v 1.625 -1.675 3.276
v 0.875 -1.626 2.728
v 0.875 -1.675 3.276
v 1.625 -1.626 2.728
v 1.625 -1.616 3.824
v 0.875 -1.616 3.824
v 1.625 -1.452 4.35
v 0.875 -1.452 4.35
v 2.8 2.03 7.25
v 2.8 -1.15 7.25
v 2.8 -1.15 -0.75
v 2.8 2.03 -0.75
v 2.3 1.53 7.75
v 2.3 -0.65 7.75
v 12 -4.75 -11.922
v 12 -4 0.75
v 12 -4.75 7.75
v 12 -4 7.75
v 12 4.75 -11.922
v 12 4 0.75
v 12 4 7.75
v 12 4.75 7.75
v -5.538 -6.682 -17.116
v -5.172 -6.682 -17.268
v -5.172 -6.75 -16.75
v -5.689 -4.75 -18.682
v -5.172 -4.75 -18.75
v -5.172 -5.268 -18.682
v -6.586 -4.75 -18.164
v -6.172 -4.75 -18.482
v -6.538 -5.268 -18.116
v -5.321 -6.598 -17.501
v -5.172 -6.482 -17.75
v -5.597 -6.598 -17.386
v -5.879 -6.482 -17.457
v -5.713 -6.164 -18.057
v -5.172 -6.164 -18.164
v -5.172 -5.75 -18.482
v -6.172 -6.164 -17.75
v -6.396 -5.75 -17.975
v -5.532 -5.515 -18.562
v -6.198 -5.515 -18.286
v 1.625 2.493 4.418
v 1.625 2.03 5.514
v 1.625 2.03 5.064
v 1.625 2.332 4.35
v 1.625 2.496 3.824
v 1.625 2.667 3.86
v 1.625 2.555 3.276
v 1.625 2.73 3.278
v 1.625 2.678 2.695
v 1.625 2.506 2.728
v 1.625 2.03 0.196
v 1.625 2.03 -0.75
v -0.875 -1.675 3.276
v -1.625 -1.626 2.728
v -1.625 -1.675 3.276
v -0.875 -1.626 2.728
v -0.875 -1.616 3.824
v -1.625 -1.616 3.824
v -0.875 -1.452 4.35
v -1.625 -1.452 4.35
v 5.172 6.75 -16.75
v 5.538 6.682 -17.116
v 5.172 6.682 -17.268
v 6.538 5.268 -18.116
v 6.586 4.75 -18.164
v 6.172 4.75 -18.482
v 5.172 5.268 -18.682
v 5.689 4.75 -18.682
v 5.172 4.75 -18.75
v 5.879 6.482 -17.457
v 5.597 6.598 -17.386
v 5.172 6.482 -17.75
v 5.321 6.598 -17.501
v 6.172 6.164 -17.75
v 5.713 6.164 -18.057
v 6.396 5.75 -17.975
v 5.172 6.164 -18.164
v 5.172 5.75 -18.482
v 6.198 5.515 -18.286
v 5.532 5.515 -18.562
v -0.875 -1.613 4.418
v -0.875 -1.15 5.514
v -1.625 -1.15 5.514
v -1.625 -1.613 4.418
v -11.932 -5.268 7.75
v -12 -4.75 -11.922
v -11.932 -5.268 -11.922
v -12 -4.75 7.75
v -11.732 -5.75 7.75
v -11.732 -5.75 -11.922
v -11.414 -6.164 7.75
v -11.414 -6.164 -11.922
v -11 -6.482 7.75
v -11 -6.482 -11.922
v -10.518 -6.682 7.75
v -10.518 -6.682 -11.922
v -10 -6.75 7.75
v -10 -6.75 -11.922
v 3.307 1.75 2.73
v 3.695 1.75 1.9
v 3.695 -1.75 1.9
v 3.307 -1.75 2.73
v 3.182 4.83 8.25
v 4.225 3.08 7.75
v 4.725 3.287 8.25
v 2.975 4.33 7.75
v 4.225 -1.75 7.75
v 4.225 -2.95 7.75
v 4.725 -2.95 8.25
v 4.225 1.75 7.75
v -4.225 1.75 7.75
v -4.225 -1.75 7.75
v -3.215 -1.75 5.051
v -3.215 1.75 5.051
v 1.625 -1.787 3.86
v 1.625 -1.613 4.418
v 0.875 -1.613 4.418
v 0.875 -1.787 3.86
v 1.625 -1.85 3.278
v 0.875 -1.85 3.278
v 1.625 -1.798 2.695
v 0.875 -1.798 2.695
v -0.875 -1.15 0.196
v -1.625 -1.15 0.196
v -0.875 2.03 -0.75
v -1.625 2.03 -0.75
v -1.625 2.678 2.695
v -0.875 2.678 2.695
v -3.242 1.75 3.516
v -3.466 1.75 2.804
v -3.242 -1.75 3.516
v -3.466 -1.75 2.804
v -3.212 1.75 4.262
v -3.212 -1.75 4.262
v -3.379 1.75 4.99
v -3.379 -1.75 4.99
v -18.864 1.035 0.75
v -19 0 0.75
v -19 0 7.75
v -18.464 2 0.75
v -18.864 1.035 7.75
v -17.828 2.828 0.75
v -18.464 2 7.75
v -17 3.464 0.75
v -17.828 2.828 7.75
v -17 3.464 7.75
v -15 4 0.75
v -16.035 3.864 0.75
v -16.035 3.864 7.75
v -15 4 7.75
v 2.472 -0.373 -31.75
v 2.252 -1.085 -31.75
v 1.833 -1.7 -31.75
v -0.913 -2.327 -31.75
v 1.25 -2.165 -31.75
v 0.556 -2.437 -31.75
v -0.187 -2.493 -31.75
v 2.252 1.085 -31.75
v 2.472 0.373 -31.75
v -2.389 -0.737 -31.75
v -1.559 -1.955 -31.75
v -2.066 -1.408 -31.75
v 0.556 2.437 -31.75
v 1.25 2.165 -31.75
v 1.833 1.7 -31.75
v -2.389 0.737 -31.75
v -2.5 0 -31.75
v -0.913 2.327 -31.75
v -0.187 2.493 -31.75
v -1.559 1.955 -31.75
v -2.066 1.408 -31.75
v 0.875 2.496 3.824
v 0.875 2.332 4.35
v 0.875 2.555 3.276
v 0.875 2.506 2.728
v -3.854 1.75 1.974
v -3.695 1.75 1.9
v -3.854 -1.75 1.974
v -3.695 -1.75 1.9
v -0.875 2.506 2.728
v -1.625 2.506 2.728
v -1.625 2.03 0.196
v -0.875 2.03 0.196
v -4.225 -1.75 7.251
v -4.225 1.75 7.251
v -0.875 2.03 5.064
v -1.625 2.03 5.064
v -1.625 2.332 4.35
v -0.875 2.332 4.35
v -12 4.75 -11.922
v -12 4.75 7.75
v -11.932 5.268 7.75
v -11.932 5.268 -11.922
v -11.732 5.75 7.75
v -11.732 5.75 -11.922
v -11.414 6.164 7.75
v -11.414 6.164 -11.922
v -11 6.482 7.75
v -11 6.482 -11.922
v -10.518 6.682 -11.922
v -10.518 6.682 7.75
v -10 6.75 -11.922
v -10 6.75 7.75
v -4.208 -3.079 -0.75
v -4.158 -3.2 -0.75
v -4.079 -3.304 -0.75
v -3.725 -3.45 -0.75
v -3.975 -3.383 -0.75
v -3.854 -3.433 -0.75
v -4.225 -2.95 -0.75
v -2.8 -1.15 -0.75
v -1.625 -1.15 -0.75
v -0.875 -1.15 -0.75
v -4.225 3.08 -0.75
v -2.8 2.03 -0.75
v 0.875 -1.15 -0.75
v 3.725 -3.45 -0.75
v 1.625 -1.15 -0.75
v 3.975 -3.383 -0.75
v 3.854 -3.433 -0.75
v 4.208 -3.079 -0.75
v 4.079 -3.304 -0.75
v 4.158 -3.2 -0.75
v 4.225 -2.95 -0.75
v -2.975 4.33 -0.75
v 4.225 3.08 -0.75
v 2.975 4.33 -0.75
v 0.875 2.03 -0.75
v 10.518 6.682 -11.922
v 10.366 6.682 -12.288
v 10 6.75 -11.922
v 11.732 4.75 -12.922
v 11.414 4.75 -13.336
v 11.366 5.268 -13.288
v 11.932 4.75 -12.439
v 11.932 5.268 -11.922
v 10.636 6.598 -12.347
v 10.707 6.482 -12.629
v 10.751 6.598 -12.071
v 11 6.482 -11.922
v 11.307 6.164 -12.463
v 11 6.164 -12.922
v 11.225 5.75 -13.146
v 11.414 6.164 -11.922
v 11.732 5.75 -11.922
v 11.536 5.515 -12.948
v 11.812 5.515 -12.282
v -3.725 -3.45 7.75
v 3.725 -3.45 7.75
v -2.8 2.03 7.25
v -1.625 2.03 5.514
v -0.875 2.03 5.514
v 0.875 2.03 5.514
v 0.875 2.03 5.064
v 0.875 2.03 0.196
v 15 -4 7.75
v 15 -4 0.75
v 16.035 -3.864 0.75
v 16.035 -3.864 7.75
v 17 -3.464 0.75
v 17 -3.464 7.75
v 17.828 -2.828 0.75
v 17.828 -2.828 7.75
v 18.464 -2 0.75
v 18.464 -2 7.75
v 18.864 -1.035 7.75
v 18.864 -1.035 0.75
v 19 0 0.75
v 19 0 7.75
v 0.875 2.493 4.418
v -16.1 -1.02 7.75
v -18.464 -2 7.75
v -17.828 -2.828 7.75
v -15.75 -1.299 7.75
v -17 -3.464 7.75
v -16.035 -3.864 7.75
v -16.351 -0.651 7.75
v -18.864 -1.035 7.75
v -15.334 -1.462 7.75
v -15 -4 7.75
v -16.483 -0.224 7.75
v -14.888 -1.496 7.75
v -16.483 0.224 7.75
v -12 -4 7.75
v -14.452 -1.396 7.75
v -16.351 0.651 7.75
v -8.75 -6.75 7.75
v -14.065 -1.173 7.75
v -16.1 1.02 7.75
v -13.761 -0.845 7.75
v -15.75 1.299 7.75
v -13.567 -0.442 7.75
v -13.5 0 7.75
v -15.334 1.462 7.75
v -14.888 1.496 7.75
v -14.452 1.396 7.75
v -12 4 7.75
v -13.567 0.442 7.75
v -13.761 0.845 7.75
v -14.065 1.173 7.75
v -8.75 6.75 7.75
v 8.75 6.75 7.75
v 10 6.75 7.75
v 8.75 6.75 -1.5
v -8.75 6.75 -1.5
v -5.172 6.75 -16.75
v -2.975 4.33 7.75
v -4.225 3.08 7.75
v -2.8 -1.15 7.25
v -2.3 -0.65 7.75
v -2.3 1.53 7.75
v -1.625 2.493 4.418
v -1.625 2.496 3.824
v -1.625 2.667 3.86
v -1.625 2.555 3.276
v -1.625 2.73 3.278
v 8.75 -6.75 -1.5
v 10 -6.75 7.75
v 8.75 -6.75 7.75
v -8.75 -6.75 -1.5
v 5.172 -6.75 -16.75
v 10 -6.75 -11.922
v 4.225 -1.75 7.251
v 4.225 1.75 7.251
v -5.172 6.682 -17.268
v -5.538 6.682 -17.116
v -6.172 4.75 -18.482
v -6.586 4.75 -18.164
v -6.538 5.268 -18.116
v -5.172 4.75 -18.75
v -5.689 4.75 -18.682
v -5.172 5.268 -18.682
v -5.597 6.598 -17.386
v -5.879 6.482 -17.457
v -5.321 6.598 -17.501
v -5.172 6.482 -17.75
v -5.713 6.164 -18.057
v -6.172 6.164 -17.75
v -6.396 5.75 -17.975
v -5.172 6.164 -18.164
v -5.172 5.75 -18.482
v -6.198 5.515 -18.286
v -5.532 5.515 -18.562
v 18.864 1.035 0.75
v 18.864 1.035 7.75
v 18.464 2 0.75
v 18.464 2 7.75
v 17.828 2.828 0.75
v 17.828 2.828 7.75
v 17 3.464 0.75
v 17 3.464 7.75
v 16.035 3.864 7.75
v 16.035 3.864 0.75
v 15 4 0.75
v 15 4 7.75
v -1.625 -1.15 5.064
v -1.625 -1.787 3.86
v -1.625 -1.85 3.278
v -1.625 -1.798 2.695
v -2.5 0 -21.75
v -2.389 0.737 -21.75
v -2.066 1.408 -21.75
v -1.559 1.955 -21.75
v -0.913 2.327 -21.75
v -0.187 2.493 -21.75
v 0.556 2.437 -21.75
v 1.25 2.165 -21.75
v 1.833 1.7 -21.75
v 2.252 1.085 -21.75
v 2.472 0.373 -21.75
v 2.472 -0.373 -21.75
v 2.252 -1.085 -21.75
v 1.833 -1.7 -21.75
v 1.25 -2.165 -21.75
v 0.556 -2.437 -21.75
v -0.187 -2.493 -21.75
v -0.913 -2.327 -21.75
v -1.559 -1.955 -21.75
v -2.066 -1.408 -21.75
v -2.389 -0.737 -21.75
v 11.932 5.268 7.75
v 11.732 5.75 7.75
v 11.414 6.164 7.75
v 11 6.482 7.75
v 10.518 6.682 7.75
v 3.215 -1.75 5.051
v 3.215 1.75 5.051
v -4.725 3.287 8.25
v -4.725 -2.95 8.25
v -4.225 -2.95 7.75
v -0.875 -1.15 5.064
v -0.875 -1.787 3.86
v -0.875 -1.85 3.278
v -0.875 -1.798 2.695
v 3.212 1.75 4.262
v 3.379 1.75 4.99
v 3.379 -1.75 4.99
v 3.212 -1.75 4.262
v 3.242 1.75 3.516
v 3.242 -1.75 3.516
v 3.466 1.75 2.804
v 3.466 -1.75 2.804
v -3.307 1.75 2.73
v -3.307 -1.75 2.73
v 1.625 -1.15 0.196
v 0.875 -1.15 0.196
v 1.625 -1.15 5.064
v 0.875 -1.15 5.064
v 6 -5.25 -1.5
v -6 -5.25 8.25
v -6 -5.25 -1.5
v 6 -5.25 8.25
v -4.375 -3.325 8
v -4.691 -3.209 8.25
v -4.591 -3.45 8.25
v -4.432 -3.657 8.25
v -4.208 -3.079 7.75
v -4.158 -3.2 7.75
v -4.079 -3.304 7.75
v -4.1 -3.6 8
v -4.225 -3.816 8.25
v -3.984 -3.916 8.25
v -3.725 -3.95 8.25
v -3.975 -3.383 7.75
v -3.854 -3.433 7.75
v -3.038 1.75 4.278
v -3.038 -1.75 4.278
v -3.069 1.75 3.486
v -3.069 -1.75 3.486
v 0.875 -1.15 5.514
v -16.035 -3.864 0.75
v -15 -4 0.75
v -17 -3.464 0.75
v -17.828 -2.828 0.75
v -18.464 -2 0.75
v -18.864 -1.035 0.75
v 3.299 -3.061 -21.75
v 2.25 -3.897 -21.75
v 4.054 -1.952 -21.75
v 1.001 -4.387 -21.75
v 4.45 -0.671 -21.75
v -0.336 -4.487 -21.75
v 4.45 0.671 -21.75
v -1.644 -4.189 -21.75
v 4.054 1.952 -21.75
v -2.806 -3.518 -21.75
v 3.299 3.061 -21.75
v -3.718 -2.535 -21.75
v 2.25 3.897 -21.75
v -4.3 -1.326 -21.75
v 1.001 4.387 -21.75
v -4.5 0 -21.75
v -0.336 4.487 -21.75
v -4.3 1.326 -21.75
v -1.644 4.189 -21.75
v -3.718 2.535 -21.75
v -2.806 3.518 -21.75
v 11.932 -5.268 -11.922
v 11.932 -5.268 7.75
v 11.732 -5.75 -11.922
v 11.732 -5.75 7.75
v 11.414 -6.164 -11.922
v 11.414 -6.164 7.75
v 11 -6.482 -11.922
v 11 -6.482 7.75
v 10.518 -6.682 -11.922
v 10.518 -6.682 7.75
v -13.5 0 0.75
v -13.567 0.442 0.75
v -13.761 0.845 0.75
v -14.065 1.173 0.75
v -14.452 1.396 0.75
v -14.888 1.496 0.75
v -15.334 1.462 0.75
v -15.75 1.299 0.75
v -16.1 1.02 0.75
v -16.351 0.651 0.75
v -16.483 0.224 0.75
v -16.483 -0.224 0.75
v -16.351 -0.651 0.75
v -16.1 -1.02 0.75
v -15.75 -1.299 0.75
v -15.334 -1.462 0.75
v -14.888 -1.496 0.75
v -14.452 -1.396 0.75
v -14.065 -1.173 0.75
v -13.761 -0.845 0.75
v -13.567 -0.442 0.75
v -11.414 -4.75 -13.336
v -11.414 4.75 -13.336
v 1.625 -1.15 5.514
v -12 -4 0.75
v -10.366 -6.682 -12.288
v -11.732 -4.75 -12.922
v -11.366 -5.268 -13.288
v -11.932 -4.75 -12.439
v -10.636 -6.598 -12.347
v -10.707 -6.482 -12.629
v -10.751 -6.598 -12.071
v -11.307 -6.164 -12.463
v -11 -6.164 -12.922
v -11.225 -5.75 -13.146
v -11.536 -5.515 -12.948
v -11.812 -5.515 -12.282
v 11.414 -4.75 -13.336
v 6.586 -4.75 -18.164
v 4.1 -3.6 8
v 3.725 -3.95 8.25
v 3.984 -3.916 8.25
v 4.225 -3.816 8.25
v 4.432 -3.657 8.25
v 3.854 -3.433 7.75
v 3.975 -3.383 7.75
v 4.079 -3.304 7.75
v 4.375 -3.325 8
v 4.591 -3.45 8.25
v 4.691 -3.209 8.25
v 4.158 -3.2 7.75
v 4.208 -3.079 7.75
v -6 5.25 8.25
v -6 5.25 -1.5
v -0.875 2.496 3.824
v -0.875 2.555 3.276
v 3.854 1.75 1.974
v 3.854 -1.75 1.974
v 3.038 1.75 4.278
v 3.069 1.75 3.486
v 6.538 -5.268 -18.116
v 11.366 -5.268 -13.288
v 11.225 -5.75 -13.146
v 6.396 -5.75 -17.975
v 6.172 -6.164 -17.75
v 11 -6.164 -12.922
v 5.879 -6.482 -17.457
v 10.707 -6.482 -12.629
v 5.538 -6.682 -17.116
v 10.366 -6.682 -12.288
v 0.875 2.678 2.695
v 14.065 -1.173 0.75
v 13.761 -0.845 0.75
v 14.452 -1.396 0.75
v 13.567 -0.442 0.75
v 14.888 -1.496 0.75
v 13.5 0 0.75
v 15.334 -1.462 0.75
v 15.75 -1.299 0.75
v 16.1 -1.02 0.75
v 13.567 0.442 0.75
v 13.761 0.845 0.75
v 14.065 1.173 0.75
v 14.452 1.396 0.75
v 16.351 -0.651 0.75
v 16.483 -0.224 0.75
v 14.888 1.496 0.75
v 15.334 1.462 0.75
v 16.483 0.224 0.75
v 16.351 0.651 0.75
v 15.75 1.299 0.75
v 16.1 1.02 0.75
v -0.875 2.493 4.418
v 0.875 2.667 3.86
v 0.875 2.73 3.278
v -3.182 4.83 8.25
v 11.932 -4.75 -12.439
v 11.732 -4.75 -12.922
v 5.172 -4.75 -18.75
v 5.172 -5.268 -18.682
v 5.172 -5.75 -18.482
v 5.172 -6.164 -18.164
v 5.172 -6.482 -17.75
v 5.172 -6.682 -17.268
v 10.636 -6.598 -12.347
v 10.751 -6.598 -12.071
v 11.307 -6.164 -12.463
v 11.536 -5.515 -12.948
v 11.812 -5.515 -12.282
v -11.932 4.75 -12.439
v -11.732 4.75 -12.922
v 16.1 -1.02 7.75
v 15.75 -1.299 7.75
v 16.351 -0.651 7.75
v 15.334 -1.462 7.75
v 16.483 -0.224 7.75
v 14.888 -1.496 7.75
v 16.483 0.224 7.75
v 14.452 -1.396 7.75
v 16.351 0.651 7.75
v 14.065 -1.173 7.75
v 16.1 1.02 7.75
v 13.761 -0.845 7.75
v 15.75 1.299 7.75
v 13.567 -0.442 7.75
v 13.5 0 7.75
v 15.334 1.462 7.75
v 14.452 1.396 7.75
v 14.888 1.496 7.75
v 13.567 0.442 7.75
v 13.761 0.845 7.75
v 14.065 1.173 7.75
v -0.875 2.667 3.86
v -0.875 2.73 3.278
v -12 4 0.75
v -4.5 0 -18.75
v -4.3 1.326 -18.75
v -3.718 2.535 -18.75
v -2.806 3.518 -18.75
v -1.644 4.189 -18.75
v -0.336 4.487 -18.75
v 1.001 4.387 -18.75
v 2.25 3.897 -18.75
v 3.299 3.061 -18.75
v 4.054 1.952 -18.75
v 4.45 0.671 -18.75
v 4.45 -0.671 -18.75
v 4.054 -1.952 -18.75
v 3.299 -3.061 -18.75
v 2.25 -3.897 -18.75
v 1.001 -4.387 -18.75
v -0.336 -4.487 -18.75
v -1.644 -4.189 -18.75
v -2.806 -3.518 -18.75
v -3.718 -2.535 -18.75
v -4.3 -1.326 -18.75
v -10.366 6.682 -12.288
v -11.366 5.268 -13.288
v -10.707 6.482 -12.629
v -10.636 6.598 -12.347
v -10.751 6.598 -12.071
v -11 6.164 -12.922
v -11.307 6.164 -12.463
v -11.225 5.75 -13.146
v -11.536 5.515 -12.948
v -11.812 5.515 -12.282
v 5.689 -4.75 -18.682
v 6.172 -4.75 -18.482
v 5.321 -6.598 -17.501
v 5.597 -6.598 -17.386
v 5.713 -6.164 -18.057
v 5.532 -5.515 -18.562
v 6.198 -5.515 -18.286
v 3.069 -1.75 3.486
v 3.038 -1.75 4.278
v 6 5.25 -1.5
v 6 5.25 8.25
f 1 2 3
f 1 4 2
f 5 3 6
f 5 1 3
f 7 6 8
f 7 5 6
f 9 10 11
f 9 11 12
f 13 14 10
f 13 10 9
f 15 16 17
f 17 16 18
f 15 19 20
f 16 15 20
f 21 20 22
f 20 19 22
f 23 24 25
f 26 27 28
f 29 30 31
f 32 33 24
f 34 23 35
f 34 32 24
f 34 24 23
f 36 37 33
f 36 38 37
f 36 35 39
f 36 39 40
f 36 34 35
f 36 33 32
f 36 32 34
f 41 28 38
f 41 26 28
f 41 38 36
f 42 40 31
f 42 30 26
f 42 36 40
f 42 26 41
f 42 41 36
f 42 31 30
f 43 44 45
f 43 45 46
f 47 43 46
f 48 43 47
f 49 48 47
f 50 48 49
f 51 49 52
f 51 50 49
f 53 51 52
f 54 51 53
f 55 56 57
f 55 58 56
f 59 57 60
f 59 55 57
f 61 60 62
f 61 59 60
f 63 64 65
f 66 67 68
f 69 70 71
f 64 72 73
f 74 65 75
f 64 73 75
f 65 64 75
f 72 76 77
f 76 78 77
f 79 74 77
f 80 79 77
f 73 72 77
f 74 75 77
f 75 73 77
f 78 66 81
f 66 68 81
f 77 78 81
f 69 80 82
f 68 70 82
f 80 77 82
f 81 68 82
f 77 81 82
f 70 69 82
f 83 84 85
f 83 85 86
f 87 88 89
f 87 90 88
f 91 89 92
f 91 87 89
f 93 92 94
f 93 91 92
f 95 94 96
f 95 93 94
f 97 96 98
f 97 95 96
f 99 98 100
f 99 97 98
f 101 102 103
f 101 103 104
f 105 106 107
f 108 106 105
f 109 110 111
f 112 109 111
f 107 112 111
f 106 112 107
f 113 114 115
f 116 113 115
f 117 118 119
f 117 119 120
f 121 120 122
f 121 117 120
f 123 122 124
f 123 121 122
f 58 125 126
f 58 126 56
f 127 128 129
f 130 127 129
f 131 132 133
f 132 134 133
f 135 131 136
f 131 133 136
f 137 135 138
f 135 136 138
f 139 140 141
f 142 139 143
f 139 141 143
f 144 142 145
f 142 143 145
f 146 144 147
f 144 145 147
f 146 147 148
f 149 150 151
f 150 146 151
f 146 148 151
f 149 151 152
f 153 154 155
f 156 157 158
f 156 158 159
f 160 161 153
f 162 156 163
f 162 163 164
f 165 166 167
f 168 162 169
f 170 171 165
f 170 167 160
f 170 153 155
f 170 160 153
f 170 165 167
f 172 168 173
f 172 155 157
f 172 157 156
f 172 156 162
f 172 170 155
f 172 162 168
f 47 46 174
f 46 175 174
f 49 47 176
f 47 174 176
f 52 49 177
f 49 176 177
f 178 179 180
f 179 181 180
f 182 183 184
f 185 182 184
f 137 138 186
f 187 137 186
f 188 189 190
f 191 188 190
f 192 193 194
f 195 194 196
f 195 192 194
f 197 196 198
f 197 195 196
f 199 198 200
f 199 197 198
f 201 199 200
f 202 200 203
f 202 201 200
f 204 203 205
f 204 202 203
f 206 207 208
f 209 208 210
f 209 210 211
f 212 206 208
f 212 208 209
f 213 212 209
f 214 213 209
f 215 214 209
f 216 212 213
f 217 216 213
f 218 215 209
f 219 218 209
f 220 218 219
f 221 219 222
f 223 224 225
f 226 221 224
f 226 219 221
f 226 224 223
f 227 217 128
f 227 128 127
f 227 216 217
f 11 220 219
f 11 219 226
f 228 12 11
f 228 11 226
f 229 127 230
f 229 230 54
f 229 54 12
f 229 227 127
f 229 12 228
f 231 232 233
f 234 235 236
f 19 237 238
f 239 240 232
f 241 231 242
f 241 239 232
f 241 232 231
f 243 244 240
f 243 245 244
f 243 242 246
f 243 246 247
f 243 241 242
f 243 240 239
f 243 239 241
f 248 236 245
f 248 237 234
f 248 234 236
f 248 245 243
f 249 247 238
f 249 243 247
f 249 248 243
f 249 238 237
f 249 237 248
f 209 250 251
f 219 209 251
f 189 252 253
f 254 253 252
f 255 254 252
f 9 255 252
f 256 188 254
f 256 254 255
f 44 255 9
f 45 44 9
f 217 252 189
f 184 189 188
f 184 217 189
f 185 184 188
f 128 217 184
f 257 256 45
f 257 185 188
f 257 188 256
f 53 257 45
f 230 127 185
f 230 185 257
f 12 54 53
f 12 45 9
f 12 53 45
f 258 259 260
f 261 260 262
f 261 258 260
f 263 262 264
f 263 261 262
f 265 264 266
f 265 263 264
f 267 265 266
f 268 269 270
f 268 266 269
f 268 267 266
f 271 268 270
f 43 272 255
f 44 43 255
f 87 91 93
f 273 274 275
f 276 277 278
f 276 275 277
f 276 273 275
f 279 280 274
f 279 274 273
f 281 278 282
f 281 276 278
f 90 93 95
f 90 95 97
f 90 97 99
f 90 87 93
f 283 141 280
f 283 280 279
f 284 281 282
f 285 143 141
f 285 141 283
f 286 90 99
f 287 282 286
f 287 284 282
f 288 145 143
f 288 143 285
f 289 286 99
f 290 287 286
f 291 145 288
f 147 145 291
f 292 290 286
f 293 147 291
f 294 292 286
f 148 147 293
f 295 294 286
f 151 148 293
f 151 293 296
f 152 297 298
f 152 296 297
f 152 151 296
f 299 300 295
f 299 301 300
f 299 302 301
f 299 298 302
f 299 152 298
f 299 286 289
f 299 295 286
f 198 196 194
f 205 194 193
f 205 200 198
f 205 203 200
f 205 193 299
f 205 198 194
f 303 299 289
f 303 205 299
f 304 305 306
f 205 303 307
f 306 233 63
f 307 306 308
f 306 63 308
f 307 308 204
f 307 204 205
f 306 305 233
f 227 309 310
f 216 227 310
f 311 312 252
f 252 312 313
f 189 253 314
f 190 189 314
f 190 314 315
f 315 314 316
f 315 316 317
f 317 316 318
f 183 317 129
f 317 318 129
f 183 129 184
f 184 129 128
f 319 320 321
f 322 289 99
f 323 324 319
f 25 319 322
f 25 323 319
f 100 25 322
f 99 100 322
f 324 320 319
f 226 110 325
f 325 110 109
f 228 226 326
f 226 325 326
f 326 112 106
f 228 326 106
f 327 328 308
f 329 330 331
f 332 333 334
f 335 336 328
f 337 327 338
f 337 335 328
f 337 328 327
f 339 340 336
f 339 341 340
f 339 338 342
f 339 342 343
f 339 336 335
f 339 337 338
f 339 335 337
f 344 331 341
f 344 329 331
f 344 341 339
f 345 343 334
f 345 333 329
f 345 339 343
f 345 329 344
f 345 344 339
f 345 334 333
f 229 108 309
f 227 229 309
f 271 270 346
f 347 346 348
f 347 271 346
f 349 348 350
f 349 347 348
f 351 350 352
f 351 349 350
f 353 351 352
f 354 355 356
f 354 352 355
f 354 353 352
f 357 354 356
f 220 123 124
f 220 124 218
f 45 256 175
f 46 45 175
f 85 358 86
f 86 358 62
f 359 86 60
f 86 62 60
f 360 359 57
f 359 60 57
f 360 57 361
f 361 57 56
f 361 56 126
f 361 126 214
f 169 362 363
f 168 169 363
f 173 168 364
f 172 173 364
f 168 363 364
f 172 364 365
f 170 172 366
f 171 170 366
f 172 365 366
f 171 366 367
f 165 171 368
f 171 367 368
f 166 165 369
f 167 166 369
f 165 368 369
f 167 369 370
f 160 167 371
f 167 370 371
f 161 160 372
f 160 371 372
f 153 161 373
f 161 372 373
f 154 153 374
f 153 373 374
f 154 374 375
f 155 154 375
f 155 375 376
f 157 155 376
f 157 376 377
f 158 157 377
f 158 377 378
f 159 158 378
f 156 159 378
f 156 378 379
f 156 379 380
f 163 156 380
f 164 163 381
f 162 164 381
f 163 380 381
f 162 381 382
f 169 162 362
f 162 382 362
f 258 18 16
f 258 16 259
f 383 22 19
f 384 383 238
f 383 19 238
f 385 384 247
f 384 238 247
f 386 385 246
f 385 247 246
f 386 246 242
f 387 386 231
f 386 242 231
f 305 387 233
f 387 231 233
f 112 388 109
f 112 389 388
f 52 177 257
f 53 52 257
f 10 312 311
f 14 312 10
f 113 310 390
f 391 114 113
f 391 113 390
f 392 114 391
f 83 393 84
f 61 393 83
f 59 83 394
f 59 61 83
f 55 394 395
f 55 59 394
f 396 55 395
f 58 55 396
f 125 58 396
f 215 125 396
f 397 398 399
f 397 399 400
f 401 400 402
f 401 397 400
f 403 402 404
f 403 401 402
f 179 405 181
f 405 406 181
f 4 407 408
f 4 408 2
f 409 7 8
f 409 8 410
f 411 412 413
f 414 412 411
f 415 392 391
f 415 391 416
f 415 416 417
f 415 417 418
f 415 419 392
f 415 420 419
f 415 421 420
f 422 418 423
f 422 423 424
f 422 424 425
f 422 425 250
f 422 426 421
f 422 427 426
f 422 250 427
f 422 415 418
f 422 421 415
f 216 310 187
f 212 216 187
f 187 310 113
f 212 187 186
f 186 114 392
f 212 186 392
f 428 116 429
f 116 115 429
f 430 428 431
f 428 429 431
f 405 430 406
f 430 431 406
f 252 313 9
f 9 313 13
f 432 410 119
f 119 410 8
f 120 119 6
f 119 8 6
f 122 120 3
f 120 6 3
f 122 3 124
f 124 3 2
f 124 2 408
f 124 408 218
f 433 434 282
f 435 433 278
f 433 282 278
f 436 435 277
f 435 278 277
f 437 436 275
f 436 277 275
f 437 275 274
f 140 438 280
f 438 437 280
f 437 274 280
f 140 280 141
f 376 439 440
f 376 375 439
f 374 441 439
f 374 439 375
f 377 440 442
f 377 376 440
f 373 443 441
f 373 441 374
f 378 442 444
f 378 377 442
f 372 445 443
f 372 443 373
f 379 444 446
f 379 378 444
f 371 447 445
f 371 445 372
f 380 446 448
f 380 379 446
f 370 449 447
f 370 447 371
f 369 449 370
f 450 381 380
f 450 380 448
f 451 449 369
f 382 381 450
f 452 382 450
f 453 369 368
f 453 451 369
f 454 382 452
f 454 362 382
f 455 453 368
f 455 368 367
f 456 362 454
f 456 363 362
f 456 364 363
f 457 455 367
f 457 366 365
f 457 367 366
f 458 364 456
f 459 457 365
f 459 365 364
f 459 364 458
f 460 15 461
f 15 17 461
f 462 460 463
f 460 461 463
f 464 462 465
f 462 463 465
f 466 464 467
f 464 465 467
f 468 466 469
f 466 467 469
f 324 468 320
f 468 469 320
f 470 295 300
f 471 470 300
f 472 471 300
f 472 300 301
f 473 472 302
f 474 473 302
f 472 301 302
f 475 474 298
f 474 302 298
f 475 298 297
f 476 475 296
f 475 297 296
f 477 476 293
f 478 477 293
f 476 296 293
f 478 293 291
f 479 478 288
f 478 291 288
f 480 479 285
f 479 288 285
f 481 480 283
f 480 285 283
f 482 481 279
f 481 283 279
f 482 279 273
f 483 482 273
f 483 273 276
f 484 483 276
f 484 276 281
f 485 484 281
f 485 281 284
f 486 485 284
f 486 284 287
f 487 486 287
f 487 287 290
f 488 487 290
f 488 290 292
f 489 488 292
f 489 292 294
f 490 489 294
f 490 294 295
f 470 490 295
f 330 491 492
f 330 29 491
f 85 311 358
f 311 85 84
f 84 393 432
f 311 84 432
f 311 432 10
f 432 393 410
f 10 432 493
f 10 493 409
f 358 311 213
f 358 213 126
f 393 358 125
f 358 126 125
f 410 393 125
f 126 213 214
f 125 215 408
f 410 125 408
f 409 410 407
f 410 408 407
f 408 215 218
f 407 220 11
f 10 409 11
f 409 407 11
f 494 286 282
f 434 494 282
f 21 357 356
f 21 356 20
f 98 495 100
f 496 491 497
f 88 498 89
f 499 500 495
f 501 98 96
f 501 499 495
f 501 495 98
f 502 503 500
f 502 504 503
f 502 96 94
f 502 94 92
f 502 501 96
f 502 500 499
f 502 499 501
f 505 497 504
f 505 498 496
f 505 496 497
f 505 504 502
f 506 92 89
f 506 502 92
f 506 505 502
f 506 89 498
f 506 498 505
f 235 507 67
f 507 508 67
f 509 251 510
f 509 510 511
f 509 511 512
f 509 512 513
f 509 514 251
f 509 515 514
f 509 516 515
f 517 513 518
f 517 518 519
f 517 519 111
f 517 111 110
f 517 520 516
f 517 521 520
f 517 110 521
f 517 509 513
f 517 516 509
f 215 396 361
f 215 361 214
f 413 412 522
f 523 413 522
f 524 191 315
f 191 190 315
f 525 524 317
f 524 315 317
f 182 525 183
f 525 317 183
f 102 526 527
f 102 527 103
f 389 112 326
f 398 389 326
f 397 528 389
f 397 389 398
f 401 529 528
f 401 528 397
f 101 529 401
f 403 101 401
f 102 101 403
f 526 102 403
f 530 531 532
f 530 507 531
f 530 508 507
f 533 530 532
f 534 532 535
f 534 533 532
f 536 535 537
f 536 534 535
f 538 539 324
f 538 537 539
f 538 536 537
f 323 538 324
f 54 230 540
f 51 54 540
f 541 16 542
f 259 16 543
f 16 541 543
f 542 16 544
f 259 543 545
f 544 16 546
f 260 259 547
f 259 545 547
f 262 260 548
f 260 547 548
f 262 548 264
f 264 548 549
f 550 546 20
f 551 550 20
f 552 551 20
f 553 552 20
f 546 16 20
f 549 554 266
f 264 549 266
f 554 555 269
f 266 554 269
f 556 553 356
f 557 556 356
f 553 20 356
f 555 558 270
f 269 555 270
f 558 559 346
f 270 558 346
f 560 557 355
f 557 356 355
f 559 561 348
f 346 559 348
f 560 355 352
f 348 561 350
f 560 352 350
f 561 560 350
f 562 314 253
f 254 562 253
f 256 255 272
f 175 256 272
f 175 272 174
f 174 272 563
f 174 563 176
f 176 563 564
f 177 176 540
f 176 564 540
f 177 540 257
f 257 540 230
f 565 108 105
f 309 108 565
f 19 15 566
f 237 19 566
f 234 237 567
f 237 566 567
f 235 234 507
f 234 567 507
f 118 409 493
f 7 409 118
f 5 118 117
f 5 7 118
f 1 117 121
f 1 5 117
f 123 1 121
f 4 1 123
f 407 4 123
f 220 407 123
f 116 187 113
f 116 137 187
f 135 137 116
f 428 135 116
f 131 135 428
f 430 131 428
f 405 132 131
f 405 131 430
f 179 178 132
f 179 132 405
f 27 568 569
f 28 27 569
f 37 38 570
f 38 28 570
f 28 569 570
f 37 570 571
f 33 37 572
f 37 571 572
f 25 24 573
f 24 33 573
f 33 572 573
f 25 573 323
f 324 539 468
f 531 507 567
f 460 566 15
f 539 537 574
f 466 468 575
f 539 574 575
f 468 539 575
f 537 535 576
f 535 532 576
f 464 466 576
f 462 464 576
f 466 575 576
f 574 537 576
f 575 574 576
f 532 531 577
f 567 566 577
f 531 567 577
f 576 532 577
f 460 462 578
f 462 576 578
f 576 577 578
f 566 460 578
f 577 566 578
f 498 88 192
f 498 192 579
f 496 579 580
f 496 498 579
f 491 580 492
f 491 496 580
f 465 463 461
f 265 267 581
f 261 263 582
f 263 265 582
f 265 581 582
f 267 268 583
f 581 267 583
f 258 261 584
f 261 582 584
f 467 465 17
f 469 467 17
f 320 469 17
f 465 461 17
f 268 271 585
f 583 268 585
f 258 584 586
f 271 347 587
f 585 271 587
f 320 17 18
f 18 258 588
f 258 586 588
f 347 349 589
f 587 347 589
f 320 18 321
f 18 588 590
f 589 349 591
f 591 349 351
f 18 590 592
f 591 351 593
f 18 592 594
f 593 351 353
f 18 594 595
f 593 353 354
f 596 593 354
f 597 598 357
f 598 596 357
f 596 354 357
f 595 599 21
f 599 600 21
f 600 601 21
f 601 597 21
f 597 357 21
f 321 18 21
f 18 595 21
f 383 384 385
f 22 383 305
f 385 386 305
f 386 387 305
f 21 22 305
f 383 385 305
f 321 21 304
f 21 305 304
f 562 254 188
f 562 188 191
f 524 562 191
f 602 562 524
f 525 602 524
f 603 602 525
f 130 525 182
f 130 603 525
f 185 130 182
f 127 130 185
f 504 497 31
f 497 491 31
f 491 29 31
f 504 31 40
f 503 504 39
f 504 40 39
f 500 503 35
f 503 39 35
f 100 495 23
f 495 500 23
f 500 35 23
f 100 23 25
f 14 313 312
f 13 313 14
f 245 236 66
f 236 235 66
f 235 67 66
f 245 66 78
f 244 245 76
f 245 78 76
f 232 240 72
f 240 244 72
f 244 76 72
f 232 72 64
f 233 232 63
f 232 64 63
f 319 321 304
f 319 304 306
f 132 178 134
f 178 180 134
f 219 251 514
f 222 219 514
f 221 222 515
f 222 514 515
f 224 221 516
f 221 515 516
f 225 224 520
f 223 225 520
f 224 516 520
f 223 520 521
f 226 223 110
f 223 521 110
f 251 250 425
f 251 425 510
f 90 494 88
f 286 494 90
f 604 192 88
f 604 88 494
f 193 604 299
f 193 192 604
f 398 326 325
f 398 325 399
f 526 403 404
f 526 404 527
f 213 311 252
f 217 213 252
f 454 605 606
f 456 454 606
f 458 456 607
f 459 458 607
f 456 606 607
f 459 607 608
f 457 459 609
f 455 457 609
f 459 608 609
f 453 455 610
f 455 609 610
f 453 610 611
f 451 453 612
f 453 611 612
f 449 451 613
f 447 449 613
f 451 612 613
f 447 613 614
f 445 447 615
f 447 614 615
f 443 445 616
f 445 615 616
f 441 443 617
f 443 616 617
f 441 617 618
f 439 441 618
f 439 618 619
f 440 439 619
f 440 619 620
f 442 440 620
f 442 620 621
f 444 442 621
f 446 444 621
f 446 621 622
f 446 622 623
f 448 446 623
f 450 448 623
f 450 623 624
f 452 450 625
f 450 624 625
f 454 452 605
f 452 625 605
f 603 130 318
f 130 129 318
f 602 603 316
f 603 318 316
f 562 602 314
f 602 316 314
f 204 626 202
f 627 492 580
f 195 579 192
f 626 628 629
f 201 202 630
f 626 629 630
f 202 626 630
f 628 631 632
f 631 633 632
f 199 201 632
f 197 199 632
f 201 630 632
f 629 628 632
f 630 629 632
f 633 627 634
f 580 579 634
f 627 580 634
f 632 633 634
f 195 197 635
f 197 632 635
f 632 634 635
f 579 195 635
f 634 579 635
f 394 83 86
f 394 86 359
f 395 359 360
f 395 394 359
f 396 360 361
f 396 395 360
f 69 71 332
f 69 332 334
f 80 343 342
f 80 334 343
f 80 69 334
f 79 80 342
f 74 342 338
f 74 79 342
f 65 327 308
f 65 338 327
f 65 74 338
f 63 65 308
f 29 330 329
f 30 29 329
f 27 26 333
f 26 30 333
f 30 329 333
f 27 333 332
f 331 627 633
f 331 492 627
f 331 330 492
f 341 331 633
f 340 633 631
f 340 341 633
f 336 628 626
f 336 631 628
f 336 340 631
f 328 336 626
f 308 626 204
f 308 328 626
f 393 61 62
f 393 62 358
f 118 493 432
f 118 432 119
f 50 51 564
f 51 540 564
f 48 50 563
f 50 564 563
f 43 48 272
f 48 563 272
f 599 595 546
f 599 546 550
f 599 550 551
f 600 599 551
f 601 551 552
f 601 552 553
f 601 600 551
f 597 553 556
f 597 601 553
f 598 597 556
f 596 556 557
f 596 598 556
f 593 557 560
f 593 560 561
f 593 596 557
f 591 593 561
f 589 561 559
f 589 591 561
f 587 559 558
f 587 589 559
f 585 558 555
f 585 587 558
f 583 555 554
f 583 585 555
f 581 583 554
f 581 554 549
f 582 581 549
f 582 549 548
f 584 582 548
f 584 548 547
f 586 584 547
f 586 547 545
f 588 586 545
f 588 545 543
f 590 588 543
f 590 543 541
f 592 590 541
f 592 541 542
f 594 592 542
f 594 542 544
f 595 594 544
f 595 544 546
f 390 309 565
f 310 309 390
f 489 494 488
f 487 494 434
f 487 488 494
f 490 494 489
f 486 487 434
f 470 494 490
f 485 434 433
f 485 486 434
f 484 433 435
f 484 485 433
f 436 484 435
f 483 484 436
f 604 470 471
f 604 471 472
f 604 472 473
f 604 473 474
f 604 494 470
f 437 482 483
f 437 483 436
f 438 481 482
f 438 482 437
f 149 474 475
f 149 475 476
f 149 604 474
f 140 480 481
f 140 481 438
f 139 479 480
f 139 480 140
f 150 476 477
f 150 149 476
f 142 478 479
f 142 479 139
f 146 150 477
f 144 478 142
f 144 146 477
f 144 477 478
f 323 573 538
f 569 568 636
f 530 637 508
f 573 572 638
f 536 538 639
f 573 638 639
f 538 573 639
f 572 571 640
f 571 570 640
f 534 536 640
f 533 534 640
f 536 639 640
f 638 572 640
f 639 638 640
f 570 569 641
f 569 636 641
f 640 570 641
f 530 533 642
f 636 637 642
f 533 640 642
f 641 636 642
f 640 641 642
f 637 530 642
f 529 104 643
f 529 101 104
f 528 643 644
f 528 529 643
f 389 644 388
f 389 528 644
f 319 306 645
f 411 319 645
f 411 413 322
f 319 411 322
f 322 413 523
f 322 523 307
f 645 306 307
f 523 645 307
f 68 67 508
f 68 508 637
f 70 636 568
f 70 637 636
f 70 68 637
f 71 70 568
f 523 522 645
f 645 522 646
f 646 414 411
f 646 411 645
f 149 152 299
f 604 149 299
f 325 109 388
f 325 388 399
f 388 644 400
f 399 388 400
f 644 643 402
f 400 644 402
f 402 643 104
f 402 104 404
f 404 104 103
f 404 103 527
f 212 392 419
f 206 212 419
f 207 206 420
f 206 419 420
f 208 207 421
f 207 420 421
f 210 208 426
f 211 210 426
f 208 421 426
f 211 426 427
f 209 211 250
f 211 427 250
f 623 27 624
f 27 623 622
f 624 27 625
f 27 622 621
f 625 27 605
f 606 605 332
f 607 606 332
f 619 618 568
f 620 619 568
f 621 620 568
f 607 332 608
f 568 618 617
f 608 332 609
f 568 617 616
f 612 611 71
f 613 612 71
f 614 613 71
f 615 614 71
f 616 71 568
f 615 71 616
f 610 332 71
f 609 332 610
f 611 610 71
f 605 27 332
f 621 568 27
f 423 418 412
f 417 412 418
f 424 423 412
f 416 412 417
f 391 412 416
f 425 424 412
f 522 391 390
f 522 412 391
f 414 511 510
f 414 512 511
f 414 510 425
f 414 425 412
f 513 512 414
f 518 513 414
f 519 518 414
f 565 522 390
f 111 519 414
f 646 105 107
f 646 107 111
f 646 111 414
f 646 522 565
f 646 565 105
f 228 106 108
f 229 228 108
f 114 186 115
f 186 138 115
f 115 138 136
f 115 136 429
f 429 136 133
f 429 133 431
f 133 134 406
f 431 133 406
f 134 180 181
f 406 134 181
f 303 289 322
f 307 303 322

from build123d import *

# Parameters (mm, degrees)
SKETCH1_W                    = 12
SKETCH1_H                    = 10.5
BASE_DEPTH                   = 8.25
CONTACT_OPENING_DEPTH        = 9
CONTACT_OPENING_LEAD_IN_SIZE = 0.5
SKETCH3_W                    = 5.6
SKETCH3_H                    = 3.18
CONTACT_AREA_DEPTH           = 8.5
CONTACT_AREA_LEAD_IN_SIZE    = 0.5
HOLDING_TINES_DEPTH          = 1.75
CONTACT_DEPTH                = 0.375
CONTACT_PATTERN_COUNT        = 2
CONTACT_PATTERN_PITCH        = 2.5
BOSS_EXTRUDE1_DEPTH          = 6.75
CHAMFER1_SIZE                = 6
SKETCH17_R                   = 1.5
CUT_EXTRUDE1_DEPTH           = 27.5
CUT_EXTRUDE2_DEPTH           = 27.5
FILLET1_R                    = 2
SKETCH20_R                   = 4.5
BOSS_EXTRUDE2_DEPTH          = 3
SKETCH21_R                   = 2.5
BOSS_EXTRUDE3_DEPTH          = 10


with BuildPart() as part:
    # Sketch1 → Base (new body, symmetric)
    with BuildSketch(Plane.XY):
        Rectangle(SKETCH1_W, SKETCH1_H)
    extrude(amount=BASE_DEPTH, both=True)

    # Sketch2 → Contact Opening (cut)
    with BuildSketch(Plane.XY.offset(8.25)):
        with BuildLine():
            Line((-2.975, 4.33), (-4.225, 3.08))
            Line((-4.225, 3.08), (-4.225, -2.95))
            ThreePointArc((-4.225, -2.95), (-4.078553391, -3.303553391), (-3.725, -3.45))
            Line((-3.725, -3.45), (3.725, -3.45))
            ThreePointArc((3.725, -3.45), (4.078553391, -3.303553391), (4.225, -2.95))
            Line((4.225, -2.95), (4.225, 3.08))
            Line((4.225, 3.08), (2.975, 4.33))
            Line((2.975, 4.33), (-2.975, 4.33))
        make_face()
    extrude(amount=-CONTACT_OPENING_DEPTH, mode=Mode.SUBTRACT)

    # Contact Opening Lead-in
    contact_opening_lead_in_edges = [part.edges().sort_by_distance(p)[0] for p in [
        (0, 4.33, 8.25),
        (-3.6, 3.705, 8.25),
        (-4.225, 0.065, 8.25),
        (-4.078553391, -3.303553391, 8.25),
        (0, -3.45, 8.25),
        (4.078553391, -3.303553391, 8.25),
        (4.225, 0.065, 8.25),
        (3.6, 3.705, 8.25),
    ]]
    chamfer(contact_opening_lead_in_edges, length=CONTACT_OPENING_LEAD_IN_SIZE)

    # Sketch3 → Contact Area (add)
    with BuildSketch(Plane.XY.offset(-0.75)):
        with Locations((0, 0.44)):
            Rectangle(SKETCH3_W, SKETCH3_H)
    extrude(amount=CONTACT_AREA_DEPTH)

    # Contact Area Lead-in
    contact_area_lead_in_edges = [part.edges().sort_by_distance(p)[0] for p in [
        (-2.8, 0.44, 7.75),
        (0, -1.15, 7.75),
        (2.8, 0.44, 7.75),
        (0, 2.03, 7.75),
    ]]
    chamfer(contact_area_lead_in_edges, length=CONTACT_AREA_LEAD_IN_SIZE)

    # Sketch7 → Holding Tines (add, symmetric)
    with BuildSketch(Plane(origin=(0, 0, 0), x_dir=(1, 0, 0), z_dir=(0, 1, 0))):
        with BuildLine():
            Line((-4.225, -7.75), (-3.215243234, -5.051316752))
            ThreePointArc((-3.215243234, -5.051316752), (-3.027350135, -3.881276433), (-3.307189725, -2.729760924))
            Line((-3.307189725, -2.729760924), (-3.695, -1.9))
            Line((-3.695, -1.9), (-3.853538933, -1.974097279))
            Line((-3.853538933, -1.974097279), (-3.465728658, -2.803858203))
            ThreePointArc((-3.465728658, -2.803858203), (-3.202213044, -3.888201975), (-3.379145712, -4.989989942))
            Line((-3.379145712, -4.989989942), (-4.388902478, -7.688673189))
            Line((-4.388902478, -7.688673189), (-4.225, -7.75))
        make_face()
        with BuildLine():
            Line((4.225, -7.75), (4.388902478, -7.688673189))
            Line((4.388902478, -7.688673189), (3.379145712, -4.989989942))
            ThreePointArc((3.379145712, -4.989989942), (3.202213044, -3.888201975), (3.465728658, -2.803858203))
            Line((3.465728658, -2.803858203), (3.853538933, -1.974097279))
            Line((3.853538933, -1.974097279), (3.695, -1.9))
            Line((3.695, -1.9), (3.307189725, -2.729760924))
            ThreePointArc((3.307189725, -2.729760924), (3.027350135, -3.881276433), (3.215243234, -5.051316752))
            Line((3.215243234, -5.051316752), (4.225, -7.75))
        make_face()
    extrude(amount=HOLDING_TINES_DEPTH, both=True)

    # Sketch8 → Contact (add, symmetric)
    with BuildSketch(Plane(origin=(-1.25, 0, 0), x_dir=(0, 0, -1), z_dir=(1, 0, 0))):
        with BuildLine():
            Line((0.75, 2.03), (-2.695251124, 2.678262825))
            ThreePointArc((-2.695251124, 2.678262825), (-3.57053143, 2.712827451), (-4.418484282, 2.493086043))
            Line((-4.418484282, 2.493086043), (-5.75, 1.93))
            Line((-5.75, 1.93), (-5.681838417, 1.768819981))
            Line((-5.681838417, 1.768819981), (-4.350322699, 2.331906024))
            ThreePointArc((-4.350322699, 2.331906024), (-3.551833763, 2.538829183), (-2.727611475, 2.506280827))
            Line((-2.727611475, 2.506280827), (0.717639649, 1.858018002))
            Line((0.717639649, 1.858018002), (0.75, 2.03))
        make_face()
        with BuildLine():
            Line((-5.681838417, -0.888819981), (-5.75, -1.05))
            Line((-5.75, -1.05), (-4.418484282, -1.613086043))
            ThreePointArc((-4.418484282, -1.613086043), (-3.57053143, -1.832827451), (-2.695251124, -1.798262825))
            Line((-2.695251124, -1.798262825), (0.75, -1.15))
            Line((0.75, -1.15), (0.717639649, -0.978018002))
            Line((0.717639649, -0.978018002), (-2.727611475, -1.626280827))
            ThreePointArc((-2.727611475, -1.626280827), (-3.551833763, -1.658829183), (-4.350322699, -1.451906024))
            Line((-4.350322699, -1.451906024), (-5.681838417, -0.888819981))
        make_face()
    contact = extrude(amount=CONTACT_DEPTH, both=True)

    # Contact Pattern: Contact ×2
    with Locations(*[(i * CONTACT_PATTERN_PITCH, 0, 0) for i in range(1, CONTACT_PATTERN_COUNT)]):
        add(contact)


with BuildPart() as body_2:
    # Sketch16 → Boss-Extrude1 (new body, symmetric)
    with BuildSketch(Plane(origin=(0, 0, 0), x_dir=(1, 0, 0), z_dir=(0, 1, 0))):
        Polygon((-8.75, 1.5), (0, 1.5), (0, 18.75), (-12, 18.75), (-12, -0.75), (-19, -0.75), (-19, -7.75), (-8.75, -7.75), align=None)
    extrude(amount=BOSS_EXTRUDE1_DEPTH, both=True)

    # Chamfer1
    chamfer1_edges = [body_2.edges().sort_by_distance(p)[0] for p in [
        (-12, 0, -18.75),
    ]]
    chamfer(chamfer1_edges, length=CHAMFER1_SIZE)

    # Sketch17 → Cut-Extrude1 (cut, through all)
    with BuildSketch(Plane.XY.offset(7.75)):
        with Locations((-15, 0)):
            Circle(SKETCH17_R)
    extrude(amount=-CUT_EXTRUDE1_DEPTH, mode=Mode.SUBTRACT)

    # Sketch18 → Cut-Extrude2 (cut, through all)
    with BuildSketch(Plane.XY.offset(7.75)):
        with BuildLine():
            ThreePointArc((-19, 0), (-17.828427125, 2.828427125), (-15, 4))
            Line((-15, 4), (-12, 4))
            Line((-12, 4), (-12, 6.75))
            Line((-12, 6.75), (-19, 6.75))
            Line((-19, 6.75), (-19, 0))
        make_face()
        with BuildLine():
            ThreePointArc((-15, -4), (-17.828427125, -2.828427125), (-19, 0))
            Line((-19, 0), (-19, -6.75))
            Line((-19, -6.75), (-12, -6.75))
            Line((-12, -6.75), (-12, -4))
            Line((-12, -4), (-15, -4))
        make_face()
    extrude(amount=-CUT_EXTRUDE2_DEPTH, mode=Mode.SUBTRACT)

    # Fillet1
    fillet1_edges = [body_2.edges().sort_by_distance(p)[0] for p in [
        (-3, 6.75, -18.75),
        (-12, -6.75, -2.5),
        (-12, 6.75, -2.5),
        (-12, 0, -12.75),
        (-9, -6.75, -15.75),
        (-6, 0, -18.75),
        (-9, 6.75, -15.75),
        (-3, -6.75, -18.75),
    ]]
    fillet(fillet1_edges, radius=FILLET1_R)

    # Mirror1: body 2 across plane


with BuildPart() as body_2_1:
    add(body_2.part)
    add(body_2.part.mirror(Plane(origin=(0, 6.75, -18.75), x_dir=(0, 0, 1), z_dir=(-1, 0, 0))))

    # Sketch20 → Boss-Extrude2 (add)
    with BuildSketch(Plane(origin=(0, 0, -18.75), x_dir=(-1, 0, 0), z_dir=(0, 0, -1))):
        Circle(SKETCH20_R)
    extrude(amount=BOSS_EXTRUDE2_DEPTH)

    # Sketch21 → Boss-Extrude3 (add)
    with BuildSketch(Plane(origin=(0, 0, -21.75), x_dir=(-1, 0, 0), z_dir=(0, 0, -1))):
        Circle(SKETCH21_R)
    extrude(amount=BOSS_EXTRUDE3_DEPTH)


with BuildPart() as part_1:
    add(part.part)

    # Combine1: union body 2
    add(body_2_1.part)


solid = part_1.part
